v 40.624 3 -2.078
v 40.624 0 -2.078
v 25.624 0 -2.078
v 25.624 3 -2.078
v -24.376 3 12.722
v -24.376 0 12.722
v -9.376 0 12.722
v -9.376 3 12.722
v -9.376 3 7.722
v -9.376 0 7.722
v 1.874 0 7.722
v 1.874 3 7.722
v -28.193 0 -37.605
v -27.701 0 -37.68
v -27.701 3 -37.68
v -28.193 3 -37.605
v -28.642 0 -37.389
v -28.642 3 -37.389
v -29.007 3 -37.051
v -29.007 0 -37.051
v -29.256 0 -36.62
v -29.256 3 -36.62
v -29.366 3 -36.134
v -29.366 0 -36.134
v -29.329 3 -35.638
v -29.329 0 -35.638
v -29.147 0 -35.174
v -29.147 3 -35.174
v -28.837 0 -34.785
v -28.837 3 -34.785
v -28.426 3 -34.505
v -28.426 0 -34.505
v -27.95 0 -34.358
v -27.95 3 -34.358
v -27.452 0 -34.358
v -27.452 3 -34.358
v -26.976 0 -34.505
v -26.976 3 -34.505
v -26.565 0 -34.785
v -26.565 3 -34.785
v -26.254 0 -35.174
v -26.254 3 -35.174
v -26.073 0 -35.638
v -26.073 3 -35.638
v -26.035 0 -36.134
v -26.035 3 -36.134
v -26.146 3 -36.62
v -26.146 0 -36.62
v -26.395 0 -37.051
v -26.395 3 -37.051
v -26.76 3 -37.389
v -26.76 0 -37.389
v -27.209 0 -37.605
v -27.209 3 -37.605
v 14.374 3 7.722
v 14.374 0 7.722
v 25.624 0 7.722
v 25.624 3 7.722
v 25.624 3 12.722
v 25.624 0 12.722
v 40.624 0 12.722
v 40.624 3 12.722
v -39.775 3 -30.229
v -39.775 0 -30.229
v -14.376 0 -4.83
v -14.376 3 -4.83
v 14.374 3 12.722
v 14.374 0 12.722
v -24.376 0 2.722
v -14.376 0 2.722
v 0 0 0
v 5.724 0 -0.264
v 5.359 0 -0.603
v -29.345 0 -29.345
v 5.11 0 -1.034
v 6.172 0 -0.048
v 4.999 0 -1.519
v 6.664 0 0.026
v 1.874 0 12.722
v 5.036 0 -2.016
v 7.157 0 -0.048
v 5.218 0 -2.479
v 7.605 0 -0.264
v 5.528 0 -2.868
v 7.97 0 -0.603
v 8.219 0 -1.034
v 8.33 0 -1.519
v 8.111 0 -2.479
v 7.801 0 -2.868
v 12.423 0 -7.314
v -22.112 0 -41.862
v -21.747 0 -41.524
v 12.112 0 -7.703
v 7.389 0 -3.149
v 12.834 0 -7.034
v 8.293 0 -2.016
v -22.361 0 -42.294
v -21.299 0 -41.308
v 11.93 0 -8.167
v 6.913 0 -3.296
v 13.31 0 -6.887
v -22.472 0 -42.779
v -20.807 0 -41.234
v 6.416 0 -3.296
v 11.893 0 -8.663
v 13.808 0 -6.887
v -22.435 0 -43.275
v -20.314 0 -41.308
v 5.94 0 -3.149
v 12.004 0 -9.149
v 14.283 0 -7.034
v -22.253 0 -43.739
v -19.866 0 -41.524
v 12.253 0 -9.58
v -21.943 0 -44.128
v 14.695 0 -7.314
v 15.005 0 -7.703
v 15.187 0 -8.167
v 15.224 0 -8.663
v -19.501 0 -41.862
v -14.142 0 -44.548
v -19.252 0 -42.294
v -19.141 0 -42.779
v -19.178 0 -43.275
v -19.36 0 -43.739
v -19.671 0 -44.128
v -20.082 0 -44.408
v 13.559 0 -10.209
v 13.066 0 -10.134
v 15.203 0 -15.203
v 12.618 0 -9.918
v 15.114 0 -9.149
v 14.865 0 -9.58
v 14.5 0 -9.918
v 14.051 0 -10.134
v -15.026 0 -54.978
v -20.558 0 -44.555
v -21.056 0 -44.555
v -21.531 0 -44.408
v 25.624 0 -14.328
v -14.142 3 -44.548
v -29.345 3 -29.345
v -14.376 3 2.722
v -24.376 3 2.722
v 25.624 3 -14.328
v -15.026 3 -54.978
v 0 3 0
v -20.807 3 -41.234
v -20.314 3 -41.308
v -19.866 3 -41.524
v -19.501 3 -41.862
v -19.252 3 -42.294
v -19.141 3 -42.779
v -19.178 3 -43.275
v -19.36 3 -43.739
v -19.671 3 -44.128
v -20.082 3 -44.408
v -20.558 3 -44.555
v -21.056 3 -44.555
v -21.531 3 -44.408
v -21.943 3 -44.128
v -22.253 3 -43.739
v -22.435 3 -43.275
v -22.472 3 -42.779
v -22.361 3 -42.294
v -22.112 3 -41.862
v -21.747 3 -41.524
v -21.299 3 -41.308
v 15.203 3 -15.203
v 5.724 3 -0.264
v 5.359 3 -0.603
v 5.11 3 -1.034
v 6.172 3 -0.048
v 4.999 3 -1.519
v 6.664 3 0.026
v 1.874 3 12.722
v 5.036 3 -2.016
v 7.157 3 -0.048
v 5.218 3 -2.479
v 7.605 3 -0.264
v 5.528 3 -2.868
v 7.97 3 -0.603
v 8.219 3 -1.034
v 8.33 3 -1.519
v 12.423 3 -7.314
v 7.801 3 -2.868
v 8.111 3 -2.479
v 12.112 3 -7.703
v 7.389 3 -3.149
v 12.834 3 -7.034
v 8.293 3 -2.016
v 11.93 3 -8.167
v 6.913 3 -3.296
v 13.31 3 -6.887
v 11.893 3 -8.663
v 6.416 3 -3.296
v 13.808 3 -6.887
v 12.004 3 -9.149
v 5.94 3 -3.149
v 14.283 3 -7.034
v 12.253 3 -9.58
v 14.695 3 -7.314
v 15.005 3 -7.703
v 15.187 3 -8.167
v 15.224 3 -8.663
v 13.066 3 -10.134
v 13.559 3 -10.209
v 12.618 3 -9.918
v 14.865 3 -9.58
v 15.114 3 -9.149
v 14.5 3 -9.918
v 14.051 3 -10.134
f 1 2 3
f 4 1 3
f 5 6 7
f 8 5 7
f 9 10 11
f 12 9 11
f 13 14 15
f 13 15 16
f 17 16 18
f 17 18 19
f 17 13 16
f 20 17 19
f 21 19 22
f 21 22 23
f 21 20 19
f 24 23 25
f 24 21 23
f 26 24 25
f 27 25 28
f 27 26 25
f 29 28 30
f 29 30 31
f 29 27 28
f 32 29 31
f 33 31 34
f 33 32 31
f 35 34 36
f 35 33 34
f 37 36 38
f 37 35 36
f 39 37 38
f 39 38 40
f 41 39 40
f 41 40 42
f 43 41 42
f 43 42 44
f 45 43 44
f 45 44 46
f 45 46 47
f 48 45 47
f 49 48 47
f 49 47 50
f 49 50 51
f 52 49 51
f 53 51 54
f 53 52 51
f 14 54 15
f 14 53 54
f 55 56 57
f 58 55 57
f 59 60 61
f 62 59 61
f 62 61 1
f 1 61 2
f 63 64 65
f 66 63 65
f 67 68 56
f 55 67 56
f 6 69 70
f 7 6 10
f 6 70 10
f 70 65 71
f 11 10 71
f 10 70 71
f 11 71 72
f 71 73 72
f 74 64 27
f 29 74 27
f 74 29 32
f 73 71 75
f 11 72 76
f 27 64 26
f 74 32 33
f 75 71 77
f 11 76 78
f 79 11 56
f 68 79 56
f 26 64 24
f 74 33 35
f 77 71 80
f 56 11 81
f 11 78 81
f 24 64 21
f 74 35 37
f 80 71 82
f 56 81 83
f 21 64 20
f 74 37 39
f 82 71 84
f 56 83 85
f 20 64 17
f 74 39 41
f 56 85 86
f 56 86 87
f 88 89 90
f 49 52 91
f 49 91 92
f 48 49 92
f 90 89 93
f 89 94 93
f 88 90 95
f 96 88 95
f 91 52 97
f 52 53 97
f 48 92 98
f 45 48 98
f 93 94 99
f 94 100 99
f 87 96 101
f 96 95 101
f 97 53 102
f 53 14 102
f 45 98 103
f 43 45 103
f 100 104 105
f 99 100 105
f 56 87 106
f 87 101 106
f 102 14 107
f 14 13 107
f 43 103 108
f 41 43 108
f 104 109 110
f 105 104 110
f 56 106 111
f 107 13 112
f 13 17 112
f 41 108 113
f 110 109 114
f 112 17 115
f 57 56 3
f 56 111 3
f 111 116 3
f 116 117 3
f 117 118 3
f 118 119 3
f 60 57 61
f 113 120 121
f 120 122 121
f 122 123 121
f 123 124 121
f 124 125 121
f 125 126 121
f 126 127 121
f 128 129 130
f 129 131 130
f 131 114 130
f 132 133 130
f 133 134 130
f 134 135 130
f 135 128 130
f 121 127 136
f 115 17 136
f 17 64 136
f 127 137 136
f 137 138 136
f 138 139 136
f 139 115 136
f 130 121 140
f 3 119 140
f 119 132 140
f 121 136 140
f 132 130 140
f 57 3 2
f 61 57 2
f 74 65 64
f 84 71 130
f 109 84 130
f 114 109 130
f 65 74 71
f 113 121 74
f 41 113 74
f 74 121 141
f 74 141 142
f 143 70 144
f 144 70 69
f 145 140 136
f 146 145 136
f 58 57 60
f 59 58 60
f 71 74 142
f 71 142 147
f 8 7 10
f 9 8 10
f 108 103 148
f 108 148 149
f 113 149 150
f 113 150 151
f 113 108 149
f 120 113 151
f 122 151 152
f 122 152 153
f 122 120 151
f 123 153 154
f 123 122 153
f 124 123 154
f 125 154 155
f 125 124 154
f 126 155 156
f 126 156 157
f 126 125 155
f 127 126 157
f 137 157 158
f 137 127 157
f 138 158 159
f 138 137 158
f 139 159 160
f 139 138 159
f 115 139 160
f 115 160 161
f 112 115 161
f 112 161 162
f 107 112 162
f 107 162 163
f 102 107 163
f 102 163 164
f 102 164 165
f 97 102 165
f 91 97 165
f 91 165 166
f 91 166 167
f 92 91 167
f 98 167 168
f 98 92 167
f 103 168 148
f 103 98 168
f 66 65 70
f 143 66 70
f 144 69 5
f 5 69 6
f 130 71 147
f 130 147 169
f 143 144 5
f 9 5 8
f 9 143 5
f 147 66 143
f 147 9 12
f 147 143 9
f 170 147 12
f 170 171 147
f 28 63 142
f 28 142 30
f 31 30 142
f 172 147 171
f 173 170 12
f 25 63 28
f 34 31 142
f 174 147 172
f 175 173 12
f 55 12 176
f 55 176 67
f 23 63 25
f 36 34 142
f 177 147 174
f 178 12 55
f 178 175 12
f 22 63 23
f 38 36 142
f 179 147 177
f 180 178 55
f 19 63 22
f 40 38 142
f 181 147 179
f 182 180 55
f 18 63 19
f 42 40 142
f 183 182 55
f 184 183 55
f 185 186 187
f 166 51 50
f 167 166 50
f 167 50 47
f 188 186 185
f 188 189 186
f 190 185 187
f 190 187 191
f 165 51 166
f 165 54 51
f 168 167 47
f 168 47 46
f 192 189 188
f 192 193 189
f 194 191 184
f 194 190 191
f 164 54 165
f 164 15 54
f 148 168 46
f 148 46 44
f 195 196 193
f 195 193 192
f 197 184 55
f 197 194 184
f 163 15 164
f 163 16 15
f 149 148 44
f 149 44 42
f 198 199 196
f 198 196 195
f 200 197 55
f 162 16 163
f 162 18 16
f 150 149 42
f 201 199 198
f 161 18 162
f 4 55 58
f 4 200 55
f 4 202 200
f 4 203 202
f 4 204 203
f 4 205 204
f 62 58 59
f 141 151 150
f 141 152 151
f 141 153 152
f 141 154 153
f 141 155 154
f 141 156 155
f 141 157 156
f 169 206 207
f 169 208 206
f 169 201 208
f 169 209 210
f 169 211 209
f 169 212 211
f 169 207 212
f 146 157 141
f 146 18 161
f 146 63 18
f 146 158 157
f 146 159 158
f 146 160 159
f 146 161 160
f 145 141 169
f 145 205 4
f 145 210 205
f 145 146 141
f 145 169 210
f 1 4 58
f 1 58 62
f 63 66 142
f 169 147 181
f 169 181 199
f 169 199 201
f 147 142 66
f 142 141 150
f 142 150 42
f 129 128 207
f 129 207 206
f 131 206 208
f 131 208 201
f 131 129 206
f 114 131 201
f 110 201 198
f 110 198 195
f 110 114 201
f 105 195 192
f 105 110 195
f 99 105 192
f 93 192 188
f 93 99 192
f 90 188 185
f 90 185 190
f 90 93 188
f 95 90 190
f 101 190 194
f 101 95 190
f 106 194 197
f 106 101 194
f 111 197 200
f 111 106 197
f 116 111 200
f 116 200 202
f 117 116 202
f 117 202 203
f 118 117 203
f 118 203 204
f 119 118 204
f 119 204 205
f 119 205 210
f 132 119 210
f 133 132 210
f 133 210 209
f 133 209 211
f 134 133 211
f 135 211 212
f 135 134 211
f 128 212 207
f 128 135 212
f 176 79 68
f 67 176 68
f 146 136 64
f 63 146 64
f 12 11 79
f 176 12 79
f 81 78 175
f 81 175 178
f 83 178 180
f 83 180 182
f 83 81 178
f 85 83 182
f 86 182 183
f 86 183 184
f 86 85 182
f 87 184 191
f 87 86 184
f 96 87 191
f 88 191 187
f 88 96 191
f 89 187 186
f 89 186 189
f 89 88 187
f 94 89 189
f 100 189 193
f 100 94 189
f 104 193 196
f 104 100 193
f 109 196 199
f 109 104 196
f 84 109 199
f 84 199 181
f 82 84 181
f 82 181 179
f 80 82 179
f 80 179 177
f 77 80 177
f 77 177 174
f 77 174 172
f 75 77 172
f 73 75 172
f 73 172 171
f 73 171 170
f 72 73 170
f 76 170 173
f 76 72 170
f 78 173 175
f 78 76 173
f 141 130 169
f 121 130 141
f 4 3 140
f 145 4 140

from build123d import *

# Parameters (mm, degrees)
SKETCH_1_R      = 1.670194834
EXTRUDE_1_DEPTH = 3


with BuildPart() as part:
    # 草图1 → 凸台-拉伸1 (new body)
    with BuildSketch(Plane(origin=(0, 0, 0), x_dir=(1, 0, 0), z_dir=(0, 1, 0))):
        Polygon((-14.3760191, 4.830077554), (-14.3760191, -2.722447763), (-24.3760191, -2.722447763), (-24.3760191, -12.722447763), (-9.3760191, -12.722447763), (-9.3760191, -7.722447763), (1.8739809, -7.722447763), (1.8739809, -12.722447763), (14.3739809, -12.722447763), (14.3739809, -7.722447763), (25.6239809, -7.722447763), (25.6239809, -12.722447763), (40.6239809, -12.722447763), (40.6239809, 2.077552237), (25.6239809, 2.077552237), (25.6239809, 14.327552237), (-15.0260191, 54.977552237), (-39.774756442, 30.228814896), align=None)
        with Locations(Location((-20.806617036, 42.903703948, 0), (0, 0, 270))):
            Circle(SKETCH_1_R, mode=Mode.SUBTRACT)
        with Locations(Location((-27.700908153, 36.009412832, 0), (0, 0, 90))):
            Circle(SKETCH_1_R, mode=Mode.SUBTRACT)
        with Locations(Location((6.664481413, 1.644023266, 0), (0, 0, 270))):
            Circle(SKETCH_1_R, mode=Mode.SUBTRACT)
        with Locations(Location((13.558772529, 8.538314383, 0), (0, 0, 90))):
            Circle(SKETCH_1_R, mode=Mode.SUBTRACT)
        Polygon((0, 0), (15.202795796, 15.202795796), (-14.142135624, 44.547727215), (-29.344931419, 29.344931419), align=None, mode=Mode.SUBTRACT)
    extrude(amount=EXTRUDE_1_DEPTH)


solid = part.part
